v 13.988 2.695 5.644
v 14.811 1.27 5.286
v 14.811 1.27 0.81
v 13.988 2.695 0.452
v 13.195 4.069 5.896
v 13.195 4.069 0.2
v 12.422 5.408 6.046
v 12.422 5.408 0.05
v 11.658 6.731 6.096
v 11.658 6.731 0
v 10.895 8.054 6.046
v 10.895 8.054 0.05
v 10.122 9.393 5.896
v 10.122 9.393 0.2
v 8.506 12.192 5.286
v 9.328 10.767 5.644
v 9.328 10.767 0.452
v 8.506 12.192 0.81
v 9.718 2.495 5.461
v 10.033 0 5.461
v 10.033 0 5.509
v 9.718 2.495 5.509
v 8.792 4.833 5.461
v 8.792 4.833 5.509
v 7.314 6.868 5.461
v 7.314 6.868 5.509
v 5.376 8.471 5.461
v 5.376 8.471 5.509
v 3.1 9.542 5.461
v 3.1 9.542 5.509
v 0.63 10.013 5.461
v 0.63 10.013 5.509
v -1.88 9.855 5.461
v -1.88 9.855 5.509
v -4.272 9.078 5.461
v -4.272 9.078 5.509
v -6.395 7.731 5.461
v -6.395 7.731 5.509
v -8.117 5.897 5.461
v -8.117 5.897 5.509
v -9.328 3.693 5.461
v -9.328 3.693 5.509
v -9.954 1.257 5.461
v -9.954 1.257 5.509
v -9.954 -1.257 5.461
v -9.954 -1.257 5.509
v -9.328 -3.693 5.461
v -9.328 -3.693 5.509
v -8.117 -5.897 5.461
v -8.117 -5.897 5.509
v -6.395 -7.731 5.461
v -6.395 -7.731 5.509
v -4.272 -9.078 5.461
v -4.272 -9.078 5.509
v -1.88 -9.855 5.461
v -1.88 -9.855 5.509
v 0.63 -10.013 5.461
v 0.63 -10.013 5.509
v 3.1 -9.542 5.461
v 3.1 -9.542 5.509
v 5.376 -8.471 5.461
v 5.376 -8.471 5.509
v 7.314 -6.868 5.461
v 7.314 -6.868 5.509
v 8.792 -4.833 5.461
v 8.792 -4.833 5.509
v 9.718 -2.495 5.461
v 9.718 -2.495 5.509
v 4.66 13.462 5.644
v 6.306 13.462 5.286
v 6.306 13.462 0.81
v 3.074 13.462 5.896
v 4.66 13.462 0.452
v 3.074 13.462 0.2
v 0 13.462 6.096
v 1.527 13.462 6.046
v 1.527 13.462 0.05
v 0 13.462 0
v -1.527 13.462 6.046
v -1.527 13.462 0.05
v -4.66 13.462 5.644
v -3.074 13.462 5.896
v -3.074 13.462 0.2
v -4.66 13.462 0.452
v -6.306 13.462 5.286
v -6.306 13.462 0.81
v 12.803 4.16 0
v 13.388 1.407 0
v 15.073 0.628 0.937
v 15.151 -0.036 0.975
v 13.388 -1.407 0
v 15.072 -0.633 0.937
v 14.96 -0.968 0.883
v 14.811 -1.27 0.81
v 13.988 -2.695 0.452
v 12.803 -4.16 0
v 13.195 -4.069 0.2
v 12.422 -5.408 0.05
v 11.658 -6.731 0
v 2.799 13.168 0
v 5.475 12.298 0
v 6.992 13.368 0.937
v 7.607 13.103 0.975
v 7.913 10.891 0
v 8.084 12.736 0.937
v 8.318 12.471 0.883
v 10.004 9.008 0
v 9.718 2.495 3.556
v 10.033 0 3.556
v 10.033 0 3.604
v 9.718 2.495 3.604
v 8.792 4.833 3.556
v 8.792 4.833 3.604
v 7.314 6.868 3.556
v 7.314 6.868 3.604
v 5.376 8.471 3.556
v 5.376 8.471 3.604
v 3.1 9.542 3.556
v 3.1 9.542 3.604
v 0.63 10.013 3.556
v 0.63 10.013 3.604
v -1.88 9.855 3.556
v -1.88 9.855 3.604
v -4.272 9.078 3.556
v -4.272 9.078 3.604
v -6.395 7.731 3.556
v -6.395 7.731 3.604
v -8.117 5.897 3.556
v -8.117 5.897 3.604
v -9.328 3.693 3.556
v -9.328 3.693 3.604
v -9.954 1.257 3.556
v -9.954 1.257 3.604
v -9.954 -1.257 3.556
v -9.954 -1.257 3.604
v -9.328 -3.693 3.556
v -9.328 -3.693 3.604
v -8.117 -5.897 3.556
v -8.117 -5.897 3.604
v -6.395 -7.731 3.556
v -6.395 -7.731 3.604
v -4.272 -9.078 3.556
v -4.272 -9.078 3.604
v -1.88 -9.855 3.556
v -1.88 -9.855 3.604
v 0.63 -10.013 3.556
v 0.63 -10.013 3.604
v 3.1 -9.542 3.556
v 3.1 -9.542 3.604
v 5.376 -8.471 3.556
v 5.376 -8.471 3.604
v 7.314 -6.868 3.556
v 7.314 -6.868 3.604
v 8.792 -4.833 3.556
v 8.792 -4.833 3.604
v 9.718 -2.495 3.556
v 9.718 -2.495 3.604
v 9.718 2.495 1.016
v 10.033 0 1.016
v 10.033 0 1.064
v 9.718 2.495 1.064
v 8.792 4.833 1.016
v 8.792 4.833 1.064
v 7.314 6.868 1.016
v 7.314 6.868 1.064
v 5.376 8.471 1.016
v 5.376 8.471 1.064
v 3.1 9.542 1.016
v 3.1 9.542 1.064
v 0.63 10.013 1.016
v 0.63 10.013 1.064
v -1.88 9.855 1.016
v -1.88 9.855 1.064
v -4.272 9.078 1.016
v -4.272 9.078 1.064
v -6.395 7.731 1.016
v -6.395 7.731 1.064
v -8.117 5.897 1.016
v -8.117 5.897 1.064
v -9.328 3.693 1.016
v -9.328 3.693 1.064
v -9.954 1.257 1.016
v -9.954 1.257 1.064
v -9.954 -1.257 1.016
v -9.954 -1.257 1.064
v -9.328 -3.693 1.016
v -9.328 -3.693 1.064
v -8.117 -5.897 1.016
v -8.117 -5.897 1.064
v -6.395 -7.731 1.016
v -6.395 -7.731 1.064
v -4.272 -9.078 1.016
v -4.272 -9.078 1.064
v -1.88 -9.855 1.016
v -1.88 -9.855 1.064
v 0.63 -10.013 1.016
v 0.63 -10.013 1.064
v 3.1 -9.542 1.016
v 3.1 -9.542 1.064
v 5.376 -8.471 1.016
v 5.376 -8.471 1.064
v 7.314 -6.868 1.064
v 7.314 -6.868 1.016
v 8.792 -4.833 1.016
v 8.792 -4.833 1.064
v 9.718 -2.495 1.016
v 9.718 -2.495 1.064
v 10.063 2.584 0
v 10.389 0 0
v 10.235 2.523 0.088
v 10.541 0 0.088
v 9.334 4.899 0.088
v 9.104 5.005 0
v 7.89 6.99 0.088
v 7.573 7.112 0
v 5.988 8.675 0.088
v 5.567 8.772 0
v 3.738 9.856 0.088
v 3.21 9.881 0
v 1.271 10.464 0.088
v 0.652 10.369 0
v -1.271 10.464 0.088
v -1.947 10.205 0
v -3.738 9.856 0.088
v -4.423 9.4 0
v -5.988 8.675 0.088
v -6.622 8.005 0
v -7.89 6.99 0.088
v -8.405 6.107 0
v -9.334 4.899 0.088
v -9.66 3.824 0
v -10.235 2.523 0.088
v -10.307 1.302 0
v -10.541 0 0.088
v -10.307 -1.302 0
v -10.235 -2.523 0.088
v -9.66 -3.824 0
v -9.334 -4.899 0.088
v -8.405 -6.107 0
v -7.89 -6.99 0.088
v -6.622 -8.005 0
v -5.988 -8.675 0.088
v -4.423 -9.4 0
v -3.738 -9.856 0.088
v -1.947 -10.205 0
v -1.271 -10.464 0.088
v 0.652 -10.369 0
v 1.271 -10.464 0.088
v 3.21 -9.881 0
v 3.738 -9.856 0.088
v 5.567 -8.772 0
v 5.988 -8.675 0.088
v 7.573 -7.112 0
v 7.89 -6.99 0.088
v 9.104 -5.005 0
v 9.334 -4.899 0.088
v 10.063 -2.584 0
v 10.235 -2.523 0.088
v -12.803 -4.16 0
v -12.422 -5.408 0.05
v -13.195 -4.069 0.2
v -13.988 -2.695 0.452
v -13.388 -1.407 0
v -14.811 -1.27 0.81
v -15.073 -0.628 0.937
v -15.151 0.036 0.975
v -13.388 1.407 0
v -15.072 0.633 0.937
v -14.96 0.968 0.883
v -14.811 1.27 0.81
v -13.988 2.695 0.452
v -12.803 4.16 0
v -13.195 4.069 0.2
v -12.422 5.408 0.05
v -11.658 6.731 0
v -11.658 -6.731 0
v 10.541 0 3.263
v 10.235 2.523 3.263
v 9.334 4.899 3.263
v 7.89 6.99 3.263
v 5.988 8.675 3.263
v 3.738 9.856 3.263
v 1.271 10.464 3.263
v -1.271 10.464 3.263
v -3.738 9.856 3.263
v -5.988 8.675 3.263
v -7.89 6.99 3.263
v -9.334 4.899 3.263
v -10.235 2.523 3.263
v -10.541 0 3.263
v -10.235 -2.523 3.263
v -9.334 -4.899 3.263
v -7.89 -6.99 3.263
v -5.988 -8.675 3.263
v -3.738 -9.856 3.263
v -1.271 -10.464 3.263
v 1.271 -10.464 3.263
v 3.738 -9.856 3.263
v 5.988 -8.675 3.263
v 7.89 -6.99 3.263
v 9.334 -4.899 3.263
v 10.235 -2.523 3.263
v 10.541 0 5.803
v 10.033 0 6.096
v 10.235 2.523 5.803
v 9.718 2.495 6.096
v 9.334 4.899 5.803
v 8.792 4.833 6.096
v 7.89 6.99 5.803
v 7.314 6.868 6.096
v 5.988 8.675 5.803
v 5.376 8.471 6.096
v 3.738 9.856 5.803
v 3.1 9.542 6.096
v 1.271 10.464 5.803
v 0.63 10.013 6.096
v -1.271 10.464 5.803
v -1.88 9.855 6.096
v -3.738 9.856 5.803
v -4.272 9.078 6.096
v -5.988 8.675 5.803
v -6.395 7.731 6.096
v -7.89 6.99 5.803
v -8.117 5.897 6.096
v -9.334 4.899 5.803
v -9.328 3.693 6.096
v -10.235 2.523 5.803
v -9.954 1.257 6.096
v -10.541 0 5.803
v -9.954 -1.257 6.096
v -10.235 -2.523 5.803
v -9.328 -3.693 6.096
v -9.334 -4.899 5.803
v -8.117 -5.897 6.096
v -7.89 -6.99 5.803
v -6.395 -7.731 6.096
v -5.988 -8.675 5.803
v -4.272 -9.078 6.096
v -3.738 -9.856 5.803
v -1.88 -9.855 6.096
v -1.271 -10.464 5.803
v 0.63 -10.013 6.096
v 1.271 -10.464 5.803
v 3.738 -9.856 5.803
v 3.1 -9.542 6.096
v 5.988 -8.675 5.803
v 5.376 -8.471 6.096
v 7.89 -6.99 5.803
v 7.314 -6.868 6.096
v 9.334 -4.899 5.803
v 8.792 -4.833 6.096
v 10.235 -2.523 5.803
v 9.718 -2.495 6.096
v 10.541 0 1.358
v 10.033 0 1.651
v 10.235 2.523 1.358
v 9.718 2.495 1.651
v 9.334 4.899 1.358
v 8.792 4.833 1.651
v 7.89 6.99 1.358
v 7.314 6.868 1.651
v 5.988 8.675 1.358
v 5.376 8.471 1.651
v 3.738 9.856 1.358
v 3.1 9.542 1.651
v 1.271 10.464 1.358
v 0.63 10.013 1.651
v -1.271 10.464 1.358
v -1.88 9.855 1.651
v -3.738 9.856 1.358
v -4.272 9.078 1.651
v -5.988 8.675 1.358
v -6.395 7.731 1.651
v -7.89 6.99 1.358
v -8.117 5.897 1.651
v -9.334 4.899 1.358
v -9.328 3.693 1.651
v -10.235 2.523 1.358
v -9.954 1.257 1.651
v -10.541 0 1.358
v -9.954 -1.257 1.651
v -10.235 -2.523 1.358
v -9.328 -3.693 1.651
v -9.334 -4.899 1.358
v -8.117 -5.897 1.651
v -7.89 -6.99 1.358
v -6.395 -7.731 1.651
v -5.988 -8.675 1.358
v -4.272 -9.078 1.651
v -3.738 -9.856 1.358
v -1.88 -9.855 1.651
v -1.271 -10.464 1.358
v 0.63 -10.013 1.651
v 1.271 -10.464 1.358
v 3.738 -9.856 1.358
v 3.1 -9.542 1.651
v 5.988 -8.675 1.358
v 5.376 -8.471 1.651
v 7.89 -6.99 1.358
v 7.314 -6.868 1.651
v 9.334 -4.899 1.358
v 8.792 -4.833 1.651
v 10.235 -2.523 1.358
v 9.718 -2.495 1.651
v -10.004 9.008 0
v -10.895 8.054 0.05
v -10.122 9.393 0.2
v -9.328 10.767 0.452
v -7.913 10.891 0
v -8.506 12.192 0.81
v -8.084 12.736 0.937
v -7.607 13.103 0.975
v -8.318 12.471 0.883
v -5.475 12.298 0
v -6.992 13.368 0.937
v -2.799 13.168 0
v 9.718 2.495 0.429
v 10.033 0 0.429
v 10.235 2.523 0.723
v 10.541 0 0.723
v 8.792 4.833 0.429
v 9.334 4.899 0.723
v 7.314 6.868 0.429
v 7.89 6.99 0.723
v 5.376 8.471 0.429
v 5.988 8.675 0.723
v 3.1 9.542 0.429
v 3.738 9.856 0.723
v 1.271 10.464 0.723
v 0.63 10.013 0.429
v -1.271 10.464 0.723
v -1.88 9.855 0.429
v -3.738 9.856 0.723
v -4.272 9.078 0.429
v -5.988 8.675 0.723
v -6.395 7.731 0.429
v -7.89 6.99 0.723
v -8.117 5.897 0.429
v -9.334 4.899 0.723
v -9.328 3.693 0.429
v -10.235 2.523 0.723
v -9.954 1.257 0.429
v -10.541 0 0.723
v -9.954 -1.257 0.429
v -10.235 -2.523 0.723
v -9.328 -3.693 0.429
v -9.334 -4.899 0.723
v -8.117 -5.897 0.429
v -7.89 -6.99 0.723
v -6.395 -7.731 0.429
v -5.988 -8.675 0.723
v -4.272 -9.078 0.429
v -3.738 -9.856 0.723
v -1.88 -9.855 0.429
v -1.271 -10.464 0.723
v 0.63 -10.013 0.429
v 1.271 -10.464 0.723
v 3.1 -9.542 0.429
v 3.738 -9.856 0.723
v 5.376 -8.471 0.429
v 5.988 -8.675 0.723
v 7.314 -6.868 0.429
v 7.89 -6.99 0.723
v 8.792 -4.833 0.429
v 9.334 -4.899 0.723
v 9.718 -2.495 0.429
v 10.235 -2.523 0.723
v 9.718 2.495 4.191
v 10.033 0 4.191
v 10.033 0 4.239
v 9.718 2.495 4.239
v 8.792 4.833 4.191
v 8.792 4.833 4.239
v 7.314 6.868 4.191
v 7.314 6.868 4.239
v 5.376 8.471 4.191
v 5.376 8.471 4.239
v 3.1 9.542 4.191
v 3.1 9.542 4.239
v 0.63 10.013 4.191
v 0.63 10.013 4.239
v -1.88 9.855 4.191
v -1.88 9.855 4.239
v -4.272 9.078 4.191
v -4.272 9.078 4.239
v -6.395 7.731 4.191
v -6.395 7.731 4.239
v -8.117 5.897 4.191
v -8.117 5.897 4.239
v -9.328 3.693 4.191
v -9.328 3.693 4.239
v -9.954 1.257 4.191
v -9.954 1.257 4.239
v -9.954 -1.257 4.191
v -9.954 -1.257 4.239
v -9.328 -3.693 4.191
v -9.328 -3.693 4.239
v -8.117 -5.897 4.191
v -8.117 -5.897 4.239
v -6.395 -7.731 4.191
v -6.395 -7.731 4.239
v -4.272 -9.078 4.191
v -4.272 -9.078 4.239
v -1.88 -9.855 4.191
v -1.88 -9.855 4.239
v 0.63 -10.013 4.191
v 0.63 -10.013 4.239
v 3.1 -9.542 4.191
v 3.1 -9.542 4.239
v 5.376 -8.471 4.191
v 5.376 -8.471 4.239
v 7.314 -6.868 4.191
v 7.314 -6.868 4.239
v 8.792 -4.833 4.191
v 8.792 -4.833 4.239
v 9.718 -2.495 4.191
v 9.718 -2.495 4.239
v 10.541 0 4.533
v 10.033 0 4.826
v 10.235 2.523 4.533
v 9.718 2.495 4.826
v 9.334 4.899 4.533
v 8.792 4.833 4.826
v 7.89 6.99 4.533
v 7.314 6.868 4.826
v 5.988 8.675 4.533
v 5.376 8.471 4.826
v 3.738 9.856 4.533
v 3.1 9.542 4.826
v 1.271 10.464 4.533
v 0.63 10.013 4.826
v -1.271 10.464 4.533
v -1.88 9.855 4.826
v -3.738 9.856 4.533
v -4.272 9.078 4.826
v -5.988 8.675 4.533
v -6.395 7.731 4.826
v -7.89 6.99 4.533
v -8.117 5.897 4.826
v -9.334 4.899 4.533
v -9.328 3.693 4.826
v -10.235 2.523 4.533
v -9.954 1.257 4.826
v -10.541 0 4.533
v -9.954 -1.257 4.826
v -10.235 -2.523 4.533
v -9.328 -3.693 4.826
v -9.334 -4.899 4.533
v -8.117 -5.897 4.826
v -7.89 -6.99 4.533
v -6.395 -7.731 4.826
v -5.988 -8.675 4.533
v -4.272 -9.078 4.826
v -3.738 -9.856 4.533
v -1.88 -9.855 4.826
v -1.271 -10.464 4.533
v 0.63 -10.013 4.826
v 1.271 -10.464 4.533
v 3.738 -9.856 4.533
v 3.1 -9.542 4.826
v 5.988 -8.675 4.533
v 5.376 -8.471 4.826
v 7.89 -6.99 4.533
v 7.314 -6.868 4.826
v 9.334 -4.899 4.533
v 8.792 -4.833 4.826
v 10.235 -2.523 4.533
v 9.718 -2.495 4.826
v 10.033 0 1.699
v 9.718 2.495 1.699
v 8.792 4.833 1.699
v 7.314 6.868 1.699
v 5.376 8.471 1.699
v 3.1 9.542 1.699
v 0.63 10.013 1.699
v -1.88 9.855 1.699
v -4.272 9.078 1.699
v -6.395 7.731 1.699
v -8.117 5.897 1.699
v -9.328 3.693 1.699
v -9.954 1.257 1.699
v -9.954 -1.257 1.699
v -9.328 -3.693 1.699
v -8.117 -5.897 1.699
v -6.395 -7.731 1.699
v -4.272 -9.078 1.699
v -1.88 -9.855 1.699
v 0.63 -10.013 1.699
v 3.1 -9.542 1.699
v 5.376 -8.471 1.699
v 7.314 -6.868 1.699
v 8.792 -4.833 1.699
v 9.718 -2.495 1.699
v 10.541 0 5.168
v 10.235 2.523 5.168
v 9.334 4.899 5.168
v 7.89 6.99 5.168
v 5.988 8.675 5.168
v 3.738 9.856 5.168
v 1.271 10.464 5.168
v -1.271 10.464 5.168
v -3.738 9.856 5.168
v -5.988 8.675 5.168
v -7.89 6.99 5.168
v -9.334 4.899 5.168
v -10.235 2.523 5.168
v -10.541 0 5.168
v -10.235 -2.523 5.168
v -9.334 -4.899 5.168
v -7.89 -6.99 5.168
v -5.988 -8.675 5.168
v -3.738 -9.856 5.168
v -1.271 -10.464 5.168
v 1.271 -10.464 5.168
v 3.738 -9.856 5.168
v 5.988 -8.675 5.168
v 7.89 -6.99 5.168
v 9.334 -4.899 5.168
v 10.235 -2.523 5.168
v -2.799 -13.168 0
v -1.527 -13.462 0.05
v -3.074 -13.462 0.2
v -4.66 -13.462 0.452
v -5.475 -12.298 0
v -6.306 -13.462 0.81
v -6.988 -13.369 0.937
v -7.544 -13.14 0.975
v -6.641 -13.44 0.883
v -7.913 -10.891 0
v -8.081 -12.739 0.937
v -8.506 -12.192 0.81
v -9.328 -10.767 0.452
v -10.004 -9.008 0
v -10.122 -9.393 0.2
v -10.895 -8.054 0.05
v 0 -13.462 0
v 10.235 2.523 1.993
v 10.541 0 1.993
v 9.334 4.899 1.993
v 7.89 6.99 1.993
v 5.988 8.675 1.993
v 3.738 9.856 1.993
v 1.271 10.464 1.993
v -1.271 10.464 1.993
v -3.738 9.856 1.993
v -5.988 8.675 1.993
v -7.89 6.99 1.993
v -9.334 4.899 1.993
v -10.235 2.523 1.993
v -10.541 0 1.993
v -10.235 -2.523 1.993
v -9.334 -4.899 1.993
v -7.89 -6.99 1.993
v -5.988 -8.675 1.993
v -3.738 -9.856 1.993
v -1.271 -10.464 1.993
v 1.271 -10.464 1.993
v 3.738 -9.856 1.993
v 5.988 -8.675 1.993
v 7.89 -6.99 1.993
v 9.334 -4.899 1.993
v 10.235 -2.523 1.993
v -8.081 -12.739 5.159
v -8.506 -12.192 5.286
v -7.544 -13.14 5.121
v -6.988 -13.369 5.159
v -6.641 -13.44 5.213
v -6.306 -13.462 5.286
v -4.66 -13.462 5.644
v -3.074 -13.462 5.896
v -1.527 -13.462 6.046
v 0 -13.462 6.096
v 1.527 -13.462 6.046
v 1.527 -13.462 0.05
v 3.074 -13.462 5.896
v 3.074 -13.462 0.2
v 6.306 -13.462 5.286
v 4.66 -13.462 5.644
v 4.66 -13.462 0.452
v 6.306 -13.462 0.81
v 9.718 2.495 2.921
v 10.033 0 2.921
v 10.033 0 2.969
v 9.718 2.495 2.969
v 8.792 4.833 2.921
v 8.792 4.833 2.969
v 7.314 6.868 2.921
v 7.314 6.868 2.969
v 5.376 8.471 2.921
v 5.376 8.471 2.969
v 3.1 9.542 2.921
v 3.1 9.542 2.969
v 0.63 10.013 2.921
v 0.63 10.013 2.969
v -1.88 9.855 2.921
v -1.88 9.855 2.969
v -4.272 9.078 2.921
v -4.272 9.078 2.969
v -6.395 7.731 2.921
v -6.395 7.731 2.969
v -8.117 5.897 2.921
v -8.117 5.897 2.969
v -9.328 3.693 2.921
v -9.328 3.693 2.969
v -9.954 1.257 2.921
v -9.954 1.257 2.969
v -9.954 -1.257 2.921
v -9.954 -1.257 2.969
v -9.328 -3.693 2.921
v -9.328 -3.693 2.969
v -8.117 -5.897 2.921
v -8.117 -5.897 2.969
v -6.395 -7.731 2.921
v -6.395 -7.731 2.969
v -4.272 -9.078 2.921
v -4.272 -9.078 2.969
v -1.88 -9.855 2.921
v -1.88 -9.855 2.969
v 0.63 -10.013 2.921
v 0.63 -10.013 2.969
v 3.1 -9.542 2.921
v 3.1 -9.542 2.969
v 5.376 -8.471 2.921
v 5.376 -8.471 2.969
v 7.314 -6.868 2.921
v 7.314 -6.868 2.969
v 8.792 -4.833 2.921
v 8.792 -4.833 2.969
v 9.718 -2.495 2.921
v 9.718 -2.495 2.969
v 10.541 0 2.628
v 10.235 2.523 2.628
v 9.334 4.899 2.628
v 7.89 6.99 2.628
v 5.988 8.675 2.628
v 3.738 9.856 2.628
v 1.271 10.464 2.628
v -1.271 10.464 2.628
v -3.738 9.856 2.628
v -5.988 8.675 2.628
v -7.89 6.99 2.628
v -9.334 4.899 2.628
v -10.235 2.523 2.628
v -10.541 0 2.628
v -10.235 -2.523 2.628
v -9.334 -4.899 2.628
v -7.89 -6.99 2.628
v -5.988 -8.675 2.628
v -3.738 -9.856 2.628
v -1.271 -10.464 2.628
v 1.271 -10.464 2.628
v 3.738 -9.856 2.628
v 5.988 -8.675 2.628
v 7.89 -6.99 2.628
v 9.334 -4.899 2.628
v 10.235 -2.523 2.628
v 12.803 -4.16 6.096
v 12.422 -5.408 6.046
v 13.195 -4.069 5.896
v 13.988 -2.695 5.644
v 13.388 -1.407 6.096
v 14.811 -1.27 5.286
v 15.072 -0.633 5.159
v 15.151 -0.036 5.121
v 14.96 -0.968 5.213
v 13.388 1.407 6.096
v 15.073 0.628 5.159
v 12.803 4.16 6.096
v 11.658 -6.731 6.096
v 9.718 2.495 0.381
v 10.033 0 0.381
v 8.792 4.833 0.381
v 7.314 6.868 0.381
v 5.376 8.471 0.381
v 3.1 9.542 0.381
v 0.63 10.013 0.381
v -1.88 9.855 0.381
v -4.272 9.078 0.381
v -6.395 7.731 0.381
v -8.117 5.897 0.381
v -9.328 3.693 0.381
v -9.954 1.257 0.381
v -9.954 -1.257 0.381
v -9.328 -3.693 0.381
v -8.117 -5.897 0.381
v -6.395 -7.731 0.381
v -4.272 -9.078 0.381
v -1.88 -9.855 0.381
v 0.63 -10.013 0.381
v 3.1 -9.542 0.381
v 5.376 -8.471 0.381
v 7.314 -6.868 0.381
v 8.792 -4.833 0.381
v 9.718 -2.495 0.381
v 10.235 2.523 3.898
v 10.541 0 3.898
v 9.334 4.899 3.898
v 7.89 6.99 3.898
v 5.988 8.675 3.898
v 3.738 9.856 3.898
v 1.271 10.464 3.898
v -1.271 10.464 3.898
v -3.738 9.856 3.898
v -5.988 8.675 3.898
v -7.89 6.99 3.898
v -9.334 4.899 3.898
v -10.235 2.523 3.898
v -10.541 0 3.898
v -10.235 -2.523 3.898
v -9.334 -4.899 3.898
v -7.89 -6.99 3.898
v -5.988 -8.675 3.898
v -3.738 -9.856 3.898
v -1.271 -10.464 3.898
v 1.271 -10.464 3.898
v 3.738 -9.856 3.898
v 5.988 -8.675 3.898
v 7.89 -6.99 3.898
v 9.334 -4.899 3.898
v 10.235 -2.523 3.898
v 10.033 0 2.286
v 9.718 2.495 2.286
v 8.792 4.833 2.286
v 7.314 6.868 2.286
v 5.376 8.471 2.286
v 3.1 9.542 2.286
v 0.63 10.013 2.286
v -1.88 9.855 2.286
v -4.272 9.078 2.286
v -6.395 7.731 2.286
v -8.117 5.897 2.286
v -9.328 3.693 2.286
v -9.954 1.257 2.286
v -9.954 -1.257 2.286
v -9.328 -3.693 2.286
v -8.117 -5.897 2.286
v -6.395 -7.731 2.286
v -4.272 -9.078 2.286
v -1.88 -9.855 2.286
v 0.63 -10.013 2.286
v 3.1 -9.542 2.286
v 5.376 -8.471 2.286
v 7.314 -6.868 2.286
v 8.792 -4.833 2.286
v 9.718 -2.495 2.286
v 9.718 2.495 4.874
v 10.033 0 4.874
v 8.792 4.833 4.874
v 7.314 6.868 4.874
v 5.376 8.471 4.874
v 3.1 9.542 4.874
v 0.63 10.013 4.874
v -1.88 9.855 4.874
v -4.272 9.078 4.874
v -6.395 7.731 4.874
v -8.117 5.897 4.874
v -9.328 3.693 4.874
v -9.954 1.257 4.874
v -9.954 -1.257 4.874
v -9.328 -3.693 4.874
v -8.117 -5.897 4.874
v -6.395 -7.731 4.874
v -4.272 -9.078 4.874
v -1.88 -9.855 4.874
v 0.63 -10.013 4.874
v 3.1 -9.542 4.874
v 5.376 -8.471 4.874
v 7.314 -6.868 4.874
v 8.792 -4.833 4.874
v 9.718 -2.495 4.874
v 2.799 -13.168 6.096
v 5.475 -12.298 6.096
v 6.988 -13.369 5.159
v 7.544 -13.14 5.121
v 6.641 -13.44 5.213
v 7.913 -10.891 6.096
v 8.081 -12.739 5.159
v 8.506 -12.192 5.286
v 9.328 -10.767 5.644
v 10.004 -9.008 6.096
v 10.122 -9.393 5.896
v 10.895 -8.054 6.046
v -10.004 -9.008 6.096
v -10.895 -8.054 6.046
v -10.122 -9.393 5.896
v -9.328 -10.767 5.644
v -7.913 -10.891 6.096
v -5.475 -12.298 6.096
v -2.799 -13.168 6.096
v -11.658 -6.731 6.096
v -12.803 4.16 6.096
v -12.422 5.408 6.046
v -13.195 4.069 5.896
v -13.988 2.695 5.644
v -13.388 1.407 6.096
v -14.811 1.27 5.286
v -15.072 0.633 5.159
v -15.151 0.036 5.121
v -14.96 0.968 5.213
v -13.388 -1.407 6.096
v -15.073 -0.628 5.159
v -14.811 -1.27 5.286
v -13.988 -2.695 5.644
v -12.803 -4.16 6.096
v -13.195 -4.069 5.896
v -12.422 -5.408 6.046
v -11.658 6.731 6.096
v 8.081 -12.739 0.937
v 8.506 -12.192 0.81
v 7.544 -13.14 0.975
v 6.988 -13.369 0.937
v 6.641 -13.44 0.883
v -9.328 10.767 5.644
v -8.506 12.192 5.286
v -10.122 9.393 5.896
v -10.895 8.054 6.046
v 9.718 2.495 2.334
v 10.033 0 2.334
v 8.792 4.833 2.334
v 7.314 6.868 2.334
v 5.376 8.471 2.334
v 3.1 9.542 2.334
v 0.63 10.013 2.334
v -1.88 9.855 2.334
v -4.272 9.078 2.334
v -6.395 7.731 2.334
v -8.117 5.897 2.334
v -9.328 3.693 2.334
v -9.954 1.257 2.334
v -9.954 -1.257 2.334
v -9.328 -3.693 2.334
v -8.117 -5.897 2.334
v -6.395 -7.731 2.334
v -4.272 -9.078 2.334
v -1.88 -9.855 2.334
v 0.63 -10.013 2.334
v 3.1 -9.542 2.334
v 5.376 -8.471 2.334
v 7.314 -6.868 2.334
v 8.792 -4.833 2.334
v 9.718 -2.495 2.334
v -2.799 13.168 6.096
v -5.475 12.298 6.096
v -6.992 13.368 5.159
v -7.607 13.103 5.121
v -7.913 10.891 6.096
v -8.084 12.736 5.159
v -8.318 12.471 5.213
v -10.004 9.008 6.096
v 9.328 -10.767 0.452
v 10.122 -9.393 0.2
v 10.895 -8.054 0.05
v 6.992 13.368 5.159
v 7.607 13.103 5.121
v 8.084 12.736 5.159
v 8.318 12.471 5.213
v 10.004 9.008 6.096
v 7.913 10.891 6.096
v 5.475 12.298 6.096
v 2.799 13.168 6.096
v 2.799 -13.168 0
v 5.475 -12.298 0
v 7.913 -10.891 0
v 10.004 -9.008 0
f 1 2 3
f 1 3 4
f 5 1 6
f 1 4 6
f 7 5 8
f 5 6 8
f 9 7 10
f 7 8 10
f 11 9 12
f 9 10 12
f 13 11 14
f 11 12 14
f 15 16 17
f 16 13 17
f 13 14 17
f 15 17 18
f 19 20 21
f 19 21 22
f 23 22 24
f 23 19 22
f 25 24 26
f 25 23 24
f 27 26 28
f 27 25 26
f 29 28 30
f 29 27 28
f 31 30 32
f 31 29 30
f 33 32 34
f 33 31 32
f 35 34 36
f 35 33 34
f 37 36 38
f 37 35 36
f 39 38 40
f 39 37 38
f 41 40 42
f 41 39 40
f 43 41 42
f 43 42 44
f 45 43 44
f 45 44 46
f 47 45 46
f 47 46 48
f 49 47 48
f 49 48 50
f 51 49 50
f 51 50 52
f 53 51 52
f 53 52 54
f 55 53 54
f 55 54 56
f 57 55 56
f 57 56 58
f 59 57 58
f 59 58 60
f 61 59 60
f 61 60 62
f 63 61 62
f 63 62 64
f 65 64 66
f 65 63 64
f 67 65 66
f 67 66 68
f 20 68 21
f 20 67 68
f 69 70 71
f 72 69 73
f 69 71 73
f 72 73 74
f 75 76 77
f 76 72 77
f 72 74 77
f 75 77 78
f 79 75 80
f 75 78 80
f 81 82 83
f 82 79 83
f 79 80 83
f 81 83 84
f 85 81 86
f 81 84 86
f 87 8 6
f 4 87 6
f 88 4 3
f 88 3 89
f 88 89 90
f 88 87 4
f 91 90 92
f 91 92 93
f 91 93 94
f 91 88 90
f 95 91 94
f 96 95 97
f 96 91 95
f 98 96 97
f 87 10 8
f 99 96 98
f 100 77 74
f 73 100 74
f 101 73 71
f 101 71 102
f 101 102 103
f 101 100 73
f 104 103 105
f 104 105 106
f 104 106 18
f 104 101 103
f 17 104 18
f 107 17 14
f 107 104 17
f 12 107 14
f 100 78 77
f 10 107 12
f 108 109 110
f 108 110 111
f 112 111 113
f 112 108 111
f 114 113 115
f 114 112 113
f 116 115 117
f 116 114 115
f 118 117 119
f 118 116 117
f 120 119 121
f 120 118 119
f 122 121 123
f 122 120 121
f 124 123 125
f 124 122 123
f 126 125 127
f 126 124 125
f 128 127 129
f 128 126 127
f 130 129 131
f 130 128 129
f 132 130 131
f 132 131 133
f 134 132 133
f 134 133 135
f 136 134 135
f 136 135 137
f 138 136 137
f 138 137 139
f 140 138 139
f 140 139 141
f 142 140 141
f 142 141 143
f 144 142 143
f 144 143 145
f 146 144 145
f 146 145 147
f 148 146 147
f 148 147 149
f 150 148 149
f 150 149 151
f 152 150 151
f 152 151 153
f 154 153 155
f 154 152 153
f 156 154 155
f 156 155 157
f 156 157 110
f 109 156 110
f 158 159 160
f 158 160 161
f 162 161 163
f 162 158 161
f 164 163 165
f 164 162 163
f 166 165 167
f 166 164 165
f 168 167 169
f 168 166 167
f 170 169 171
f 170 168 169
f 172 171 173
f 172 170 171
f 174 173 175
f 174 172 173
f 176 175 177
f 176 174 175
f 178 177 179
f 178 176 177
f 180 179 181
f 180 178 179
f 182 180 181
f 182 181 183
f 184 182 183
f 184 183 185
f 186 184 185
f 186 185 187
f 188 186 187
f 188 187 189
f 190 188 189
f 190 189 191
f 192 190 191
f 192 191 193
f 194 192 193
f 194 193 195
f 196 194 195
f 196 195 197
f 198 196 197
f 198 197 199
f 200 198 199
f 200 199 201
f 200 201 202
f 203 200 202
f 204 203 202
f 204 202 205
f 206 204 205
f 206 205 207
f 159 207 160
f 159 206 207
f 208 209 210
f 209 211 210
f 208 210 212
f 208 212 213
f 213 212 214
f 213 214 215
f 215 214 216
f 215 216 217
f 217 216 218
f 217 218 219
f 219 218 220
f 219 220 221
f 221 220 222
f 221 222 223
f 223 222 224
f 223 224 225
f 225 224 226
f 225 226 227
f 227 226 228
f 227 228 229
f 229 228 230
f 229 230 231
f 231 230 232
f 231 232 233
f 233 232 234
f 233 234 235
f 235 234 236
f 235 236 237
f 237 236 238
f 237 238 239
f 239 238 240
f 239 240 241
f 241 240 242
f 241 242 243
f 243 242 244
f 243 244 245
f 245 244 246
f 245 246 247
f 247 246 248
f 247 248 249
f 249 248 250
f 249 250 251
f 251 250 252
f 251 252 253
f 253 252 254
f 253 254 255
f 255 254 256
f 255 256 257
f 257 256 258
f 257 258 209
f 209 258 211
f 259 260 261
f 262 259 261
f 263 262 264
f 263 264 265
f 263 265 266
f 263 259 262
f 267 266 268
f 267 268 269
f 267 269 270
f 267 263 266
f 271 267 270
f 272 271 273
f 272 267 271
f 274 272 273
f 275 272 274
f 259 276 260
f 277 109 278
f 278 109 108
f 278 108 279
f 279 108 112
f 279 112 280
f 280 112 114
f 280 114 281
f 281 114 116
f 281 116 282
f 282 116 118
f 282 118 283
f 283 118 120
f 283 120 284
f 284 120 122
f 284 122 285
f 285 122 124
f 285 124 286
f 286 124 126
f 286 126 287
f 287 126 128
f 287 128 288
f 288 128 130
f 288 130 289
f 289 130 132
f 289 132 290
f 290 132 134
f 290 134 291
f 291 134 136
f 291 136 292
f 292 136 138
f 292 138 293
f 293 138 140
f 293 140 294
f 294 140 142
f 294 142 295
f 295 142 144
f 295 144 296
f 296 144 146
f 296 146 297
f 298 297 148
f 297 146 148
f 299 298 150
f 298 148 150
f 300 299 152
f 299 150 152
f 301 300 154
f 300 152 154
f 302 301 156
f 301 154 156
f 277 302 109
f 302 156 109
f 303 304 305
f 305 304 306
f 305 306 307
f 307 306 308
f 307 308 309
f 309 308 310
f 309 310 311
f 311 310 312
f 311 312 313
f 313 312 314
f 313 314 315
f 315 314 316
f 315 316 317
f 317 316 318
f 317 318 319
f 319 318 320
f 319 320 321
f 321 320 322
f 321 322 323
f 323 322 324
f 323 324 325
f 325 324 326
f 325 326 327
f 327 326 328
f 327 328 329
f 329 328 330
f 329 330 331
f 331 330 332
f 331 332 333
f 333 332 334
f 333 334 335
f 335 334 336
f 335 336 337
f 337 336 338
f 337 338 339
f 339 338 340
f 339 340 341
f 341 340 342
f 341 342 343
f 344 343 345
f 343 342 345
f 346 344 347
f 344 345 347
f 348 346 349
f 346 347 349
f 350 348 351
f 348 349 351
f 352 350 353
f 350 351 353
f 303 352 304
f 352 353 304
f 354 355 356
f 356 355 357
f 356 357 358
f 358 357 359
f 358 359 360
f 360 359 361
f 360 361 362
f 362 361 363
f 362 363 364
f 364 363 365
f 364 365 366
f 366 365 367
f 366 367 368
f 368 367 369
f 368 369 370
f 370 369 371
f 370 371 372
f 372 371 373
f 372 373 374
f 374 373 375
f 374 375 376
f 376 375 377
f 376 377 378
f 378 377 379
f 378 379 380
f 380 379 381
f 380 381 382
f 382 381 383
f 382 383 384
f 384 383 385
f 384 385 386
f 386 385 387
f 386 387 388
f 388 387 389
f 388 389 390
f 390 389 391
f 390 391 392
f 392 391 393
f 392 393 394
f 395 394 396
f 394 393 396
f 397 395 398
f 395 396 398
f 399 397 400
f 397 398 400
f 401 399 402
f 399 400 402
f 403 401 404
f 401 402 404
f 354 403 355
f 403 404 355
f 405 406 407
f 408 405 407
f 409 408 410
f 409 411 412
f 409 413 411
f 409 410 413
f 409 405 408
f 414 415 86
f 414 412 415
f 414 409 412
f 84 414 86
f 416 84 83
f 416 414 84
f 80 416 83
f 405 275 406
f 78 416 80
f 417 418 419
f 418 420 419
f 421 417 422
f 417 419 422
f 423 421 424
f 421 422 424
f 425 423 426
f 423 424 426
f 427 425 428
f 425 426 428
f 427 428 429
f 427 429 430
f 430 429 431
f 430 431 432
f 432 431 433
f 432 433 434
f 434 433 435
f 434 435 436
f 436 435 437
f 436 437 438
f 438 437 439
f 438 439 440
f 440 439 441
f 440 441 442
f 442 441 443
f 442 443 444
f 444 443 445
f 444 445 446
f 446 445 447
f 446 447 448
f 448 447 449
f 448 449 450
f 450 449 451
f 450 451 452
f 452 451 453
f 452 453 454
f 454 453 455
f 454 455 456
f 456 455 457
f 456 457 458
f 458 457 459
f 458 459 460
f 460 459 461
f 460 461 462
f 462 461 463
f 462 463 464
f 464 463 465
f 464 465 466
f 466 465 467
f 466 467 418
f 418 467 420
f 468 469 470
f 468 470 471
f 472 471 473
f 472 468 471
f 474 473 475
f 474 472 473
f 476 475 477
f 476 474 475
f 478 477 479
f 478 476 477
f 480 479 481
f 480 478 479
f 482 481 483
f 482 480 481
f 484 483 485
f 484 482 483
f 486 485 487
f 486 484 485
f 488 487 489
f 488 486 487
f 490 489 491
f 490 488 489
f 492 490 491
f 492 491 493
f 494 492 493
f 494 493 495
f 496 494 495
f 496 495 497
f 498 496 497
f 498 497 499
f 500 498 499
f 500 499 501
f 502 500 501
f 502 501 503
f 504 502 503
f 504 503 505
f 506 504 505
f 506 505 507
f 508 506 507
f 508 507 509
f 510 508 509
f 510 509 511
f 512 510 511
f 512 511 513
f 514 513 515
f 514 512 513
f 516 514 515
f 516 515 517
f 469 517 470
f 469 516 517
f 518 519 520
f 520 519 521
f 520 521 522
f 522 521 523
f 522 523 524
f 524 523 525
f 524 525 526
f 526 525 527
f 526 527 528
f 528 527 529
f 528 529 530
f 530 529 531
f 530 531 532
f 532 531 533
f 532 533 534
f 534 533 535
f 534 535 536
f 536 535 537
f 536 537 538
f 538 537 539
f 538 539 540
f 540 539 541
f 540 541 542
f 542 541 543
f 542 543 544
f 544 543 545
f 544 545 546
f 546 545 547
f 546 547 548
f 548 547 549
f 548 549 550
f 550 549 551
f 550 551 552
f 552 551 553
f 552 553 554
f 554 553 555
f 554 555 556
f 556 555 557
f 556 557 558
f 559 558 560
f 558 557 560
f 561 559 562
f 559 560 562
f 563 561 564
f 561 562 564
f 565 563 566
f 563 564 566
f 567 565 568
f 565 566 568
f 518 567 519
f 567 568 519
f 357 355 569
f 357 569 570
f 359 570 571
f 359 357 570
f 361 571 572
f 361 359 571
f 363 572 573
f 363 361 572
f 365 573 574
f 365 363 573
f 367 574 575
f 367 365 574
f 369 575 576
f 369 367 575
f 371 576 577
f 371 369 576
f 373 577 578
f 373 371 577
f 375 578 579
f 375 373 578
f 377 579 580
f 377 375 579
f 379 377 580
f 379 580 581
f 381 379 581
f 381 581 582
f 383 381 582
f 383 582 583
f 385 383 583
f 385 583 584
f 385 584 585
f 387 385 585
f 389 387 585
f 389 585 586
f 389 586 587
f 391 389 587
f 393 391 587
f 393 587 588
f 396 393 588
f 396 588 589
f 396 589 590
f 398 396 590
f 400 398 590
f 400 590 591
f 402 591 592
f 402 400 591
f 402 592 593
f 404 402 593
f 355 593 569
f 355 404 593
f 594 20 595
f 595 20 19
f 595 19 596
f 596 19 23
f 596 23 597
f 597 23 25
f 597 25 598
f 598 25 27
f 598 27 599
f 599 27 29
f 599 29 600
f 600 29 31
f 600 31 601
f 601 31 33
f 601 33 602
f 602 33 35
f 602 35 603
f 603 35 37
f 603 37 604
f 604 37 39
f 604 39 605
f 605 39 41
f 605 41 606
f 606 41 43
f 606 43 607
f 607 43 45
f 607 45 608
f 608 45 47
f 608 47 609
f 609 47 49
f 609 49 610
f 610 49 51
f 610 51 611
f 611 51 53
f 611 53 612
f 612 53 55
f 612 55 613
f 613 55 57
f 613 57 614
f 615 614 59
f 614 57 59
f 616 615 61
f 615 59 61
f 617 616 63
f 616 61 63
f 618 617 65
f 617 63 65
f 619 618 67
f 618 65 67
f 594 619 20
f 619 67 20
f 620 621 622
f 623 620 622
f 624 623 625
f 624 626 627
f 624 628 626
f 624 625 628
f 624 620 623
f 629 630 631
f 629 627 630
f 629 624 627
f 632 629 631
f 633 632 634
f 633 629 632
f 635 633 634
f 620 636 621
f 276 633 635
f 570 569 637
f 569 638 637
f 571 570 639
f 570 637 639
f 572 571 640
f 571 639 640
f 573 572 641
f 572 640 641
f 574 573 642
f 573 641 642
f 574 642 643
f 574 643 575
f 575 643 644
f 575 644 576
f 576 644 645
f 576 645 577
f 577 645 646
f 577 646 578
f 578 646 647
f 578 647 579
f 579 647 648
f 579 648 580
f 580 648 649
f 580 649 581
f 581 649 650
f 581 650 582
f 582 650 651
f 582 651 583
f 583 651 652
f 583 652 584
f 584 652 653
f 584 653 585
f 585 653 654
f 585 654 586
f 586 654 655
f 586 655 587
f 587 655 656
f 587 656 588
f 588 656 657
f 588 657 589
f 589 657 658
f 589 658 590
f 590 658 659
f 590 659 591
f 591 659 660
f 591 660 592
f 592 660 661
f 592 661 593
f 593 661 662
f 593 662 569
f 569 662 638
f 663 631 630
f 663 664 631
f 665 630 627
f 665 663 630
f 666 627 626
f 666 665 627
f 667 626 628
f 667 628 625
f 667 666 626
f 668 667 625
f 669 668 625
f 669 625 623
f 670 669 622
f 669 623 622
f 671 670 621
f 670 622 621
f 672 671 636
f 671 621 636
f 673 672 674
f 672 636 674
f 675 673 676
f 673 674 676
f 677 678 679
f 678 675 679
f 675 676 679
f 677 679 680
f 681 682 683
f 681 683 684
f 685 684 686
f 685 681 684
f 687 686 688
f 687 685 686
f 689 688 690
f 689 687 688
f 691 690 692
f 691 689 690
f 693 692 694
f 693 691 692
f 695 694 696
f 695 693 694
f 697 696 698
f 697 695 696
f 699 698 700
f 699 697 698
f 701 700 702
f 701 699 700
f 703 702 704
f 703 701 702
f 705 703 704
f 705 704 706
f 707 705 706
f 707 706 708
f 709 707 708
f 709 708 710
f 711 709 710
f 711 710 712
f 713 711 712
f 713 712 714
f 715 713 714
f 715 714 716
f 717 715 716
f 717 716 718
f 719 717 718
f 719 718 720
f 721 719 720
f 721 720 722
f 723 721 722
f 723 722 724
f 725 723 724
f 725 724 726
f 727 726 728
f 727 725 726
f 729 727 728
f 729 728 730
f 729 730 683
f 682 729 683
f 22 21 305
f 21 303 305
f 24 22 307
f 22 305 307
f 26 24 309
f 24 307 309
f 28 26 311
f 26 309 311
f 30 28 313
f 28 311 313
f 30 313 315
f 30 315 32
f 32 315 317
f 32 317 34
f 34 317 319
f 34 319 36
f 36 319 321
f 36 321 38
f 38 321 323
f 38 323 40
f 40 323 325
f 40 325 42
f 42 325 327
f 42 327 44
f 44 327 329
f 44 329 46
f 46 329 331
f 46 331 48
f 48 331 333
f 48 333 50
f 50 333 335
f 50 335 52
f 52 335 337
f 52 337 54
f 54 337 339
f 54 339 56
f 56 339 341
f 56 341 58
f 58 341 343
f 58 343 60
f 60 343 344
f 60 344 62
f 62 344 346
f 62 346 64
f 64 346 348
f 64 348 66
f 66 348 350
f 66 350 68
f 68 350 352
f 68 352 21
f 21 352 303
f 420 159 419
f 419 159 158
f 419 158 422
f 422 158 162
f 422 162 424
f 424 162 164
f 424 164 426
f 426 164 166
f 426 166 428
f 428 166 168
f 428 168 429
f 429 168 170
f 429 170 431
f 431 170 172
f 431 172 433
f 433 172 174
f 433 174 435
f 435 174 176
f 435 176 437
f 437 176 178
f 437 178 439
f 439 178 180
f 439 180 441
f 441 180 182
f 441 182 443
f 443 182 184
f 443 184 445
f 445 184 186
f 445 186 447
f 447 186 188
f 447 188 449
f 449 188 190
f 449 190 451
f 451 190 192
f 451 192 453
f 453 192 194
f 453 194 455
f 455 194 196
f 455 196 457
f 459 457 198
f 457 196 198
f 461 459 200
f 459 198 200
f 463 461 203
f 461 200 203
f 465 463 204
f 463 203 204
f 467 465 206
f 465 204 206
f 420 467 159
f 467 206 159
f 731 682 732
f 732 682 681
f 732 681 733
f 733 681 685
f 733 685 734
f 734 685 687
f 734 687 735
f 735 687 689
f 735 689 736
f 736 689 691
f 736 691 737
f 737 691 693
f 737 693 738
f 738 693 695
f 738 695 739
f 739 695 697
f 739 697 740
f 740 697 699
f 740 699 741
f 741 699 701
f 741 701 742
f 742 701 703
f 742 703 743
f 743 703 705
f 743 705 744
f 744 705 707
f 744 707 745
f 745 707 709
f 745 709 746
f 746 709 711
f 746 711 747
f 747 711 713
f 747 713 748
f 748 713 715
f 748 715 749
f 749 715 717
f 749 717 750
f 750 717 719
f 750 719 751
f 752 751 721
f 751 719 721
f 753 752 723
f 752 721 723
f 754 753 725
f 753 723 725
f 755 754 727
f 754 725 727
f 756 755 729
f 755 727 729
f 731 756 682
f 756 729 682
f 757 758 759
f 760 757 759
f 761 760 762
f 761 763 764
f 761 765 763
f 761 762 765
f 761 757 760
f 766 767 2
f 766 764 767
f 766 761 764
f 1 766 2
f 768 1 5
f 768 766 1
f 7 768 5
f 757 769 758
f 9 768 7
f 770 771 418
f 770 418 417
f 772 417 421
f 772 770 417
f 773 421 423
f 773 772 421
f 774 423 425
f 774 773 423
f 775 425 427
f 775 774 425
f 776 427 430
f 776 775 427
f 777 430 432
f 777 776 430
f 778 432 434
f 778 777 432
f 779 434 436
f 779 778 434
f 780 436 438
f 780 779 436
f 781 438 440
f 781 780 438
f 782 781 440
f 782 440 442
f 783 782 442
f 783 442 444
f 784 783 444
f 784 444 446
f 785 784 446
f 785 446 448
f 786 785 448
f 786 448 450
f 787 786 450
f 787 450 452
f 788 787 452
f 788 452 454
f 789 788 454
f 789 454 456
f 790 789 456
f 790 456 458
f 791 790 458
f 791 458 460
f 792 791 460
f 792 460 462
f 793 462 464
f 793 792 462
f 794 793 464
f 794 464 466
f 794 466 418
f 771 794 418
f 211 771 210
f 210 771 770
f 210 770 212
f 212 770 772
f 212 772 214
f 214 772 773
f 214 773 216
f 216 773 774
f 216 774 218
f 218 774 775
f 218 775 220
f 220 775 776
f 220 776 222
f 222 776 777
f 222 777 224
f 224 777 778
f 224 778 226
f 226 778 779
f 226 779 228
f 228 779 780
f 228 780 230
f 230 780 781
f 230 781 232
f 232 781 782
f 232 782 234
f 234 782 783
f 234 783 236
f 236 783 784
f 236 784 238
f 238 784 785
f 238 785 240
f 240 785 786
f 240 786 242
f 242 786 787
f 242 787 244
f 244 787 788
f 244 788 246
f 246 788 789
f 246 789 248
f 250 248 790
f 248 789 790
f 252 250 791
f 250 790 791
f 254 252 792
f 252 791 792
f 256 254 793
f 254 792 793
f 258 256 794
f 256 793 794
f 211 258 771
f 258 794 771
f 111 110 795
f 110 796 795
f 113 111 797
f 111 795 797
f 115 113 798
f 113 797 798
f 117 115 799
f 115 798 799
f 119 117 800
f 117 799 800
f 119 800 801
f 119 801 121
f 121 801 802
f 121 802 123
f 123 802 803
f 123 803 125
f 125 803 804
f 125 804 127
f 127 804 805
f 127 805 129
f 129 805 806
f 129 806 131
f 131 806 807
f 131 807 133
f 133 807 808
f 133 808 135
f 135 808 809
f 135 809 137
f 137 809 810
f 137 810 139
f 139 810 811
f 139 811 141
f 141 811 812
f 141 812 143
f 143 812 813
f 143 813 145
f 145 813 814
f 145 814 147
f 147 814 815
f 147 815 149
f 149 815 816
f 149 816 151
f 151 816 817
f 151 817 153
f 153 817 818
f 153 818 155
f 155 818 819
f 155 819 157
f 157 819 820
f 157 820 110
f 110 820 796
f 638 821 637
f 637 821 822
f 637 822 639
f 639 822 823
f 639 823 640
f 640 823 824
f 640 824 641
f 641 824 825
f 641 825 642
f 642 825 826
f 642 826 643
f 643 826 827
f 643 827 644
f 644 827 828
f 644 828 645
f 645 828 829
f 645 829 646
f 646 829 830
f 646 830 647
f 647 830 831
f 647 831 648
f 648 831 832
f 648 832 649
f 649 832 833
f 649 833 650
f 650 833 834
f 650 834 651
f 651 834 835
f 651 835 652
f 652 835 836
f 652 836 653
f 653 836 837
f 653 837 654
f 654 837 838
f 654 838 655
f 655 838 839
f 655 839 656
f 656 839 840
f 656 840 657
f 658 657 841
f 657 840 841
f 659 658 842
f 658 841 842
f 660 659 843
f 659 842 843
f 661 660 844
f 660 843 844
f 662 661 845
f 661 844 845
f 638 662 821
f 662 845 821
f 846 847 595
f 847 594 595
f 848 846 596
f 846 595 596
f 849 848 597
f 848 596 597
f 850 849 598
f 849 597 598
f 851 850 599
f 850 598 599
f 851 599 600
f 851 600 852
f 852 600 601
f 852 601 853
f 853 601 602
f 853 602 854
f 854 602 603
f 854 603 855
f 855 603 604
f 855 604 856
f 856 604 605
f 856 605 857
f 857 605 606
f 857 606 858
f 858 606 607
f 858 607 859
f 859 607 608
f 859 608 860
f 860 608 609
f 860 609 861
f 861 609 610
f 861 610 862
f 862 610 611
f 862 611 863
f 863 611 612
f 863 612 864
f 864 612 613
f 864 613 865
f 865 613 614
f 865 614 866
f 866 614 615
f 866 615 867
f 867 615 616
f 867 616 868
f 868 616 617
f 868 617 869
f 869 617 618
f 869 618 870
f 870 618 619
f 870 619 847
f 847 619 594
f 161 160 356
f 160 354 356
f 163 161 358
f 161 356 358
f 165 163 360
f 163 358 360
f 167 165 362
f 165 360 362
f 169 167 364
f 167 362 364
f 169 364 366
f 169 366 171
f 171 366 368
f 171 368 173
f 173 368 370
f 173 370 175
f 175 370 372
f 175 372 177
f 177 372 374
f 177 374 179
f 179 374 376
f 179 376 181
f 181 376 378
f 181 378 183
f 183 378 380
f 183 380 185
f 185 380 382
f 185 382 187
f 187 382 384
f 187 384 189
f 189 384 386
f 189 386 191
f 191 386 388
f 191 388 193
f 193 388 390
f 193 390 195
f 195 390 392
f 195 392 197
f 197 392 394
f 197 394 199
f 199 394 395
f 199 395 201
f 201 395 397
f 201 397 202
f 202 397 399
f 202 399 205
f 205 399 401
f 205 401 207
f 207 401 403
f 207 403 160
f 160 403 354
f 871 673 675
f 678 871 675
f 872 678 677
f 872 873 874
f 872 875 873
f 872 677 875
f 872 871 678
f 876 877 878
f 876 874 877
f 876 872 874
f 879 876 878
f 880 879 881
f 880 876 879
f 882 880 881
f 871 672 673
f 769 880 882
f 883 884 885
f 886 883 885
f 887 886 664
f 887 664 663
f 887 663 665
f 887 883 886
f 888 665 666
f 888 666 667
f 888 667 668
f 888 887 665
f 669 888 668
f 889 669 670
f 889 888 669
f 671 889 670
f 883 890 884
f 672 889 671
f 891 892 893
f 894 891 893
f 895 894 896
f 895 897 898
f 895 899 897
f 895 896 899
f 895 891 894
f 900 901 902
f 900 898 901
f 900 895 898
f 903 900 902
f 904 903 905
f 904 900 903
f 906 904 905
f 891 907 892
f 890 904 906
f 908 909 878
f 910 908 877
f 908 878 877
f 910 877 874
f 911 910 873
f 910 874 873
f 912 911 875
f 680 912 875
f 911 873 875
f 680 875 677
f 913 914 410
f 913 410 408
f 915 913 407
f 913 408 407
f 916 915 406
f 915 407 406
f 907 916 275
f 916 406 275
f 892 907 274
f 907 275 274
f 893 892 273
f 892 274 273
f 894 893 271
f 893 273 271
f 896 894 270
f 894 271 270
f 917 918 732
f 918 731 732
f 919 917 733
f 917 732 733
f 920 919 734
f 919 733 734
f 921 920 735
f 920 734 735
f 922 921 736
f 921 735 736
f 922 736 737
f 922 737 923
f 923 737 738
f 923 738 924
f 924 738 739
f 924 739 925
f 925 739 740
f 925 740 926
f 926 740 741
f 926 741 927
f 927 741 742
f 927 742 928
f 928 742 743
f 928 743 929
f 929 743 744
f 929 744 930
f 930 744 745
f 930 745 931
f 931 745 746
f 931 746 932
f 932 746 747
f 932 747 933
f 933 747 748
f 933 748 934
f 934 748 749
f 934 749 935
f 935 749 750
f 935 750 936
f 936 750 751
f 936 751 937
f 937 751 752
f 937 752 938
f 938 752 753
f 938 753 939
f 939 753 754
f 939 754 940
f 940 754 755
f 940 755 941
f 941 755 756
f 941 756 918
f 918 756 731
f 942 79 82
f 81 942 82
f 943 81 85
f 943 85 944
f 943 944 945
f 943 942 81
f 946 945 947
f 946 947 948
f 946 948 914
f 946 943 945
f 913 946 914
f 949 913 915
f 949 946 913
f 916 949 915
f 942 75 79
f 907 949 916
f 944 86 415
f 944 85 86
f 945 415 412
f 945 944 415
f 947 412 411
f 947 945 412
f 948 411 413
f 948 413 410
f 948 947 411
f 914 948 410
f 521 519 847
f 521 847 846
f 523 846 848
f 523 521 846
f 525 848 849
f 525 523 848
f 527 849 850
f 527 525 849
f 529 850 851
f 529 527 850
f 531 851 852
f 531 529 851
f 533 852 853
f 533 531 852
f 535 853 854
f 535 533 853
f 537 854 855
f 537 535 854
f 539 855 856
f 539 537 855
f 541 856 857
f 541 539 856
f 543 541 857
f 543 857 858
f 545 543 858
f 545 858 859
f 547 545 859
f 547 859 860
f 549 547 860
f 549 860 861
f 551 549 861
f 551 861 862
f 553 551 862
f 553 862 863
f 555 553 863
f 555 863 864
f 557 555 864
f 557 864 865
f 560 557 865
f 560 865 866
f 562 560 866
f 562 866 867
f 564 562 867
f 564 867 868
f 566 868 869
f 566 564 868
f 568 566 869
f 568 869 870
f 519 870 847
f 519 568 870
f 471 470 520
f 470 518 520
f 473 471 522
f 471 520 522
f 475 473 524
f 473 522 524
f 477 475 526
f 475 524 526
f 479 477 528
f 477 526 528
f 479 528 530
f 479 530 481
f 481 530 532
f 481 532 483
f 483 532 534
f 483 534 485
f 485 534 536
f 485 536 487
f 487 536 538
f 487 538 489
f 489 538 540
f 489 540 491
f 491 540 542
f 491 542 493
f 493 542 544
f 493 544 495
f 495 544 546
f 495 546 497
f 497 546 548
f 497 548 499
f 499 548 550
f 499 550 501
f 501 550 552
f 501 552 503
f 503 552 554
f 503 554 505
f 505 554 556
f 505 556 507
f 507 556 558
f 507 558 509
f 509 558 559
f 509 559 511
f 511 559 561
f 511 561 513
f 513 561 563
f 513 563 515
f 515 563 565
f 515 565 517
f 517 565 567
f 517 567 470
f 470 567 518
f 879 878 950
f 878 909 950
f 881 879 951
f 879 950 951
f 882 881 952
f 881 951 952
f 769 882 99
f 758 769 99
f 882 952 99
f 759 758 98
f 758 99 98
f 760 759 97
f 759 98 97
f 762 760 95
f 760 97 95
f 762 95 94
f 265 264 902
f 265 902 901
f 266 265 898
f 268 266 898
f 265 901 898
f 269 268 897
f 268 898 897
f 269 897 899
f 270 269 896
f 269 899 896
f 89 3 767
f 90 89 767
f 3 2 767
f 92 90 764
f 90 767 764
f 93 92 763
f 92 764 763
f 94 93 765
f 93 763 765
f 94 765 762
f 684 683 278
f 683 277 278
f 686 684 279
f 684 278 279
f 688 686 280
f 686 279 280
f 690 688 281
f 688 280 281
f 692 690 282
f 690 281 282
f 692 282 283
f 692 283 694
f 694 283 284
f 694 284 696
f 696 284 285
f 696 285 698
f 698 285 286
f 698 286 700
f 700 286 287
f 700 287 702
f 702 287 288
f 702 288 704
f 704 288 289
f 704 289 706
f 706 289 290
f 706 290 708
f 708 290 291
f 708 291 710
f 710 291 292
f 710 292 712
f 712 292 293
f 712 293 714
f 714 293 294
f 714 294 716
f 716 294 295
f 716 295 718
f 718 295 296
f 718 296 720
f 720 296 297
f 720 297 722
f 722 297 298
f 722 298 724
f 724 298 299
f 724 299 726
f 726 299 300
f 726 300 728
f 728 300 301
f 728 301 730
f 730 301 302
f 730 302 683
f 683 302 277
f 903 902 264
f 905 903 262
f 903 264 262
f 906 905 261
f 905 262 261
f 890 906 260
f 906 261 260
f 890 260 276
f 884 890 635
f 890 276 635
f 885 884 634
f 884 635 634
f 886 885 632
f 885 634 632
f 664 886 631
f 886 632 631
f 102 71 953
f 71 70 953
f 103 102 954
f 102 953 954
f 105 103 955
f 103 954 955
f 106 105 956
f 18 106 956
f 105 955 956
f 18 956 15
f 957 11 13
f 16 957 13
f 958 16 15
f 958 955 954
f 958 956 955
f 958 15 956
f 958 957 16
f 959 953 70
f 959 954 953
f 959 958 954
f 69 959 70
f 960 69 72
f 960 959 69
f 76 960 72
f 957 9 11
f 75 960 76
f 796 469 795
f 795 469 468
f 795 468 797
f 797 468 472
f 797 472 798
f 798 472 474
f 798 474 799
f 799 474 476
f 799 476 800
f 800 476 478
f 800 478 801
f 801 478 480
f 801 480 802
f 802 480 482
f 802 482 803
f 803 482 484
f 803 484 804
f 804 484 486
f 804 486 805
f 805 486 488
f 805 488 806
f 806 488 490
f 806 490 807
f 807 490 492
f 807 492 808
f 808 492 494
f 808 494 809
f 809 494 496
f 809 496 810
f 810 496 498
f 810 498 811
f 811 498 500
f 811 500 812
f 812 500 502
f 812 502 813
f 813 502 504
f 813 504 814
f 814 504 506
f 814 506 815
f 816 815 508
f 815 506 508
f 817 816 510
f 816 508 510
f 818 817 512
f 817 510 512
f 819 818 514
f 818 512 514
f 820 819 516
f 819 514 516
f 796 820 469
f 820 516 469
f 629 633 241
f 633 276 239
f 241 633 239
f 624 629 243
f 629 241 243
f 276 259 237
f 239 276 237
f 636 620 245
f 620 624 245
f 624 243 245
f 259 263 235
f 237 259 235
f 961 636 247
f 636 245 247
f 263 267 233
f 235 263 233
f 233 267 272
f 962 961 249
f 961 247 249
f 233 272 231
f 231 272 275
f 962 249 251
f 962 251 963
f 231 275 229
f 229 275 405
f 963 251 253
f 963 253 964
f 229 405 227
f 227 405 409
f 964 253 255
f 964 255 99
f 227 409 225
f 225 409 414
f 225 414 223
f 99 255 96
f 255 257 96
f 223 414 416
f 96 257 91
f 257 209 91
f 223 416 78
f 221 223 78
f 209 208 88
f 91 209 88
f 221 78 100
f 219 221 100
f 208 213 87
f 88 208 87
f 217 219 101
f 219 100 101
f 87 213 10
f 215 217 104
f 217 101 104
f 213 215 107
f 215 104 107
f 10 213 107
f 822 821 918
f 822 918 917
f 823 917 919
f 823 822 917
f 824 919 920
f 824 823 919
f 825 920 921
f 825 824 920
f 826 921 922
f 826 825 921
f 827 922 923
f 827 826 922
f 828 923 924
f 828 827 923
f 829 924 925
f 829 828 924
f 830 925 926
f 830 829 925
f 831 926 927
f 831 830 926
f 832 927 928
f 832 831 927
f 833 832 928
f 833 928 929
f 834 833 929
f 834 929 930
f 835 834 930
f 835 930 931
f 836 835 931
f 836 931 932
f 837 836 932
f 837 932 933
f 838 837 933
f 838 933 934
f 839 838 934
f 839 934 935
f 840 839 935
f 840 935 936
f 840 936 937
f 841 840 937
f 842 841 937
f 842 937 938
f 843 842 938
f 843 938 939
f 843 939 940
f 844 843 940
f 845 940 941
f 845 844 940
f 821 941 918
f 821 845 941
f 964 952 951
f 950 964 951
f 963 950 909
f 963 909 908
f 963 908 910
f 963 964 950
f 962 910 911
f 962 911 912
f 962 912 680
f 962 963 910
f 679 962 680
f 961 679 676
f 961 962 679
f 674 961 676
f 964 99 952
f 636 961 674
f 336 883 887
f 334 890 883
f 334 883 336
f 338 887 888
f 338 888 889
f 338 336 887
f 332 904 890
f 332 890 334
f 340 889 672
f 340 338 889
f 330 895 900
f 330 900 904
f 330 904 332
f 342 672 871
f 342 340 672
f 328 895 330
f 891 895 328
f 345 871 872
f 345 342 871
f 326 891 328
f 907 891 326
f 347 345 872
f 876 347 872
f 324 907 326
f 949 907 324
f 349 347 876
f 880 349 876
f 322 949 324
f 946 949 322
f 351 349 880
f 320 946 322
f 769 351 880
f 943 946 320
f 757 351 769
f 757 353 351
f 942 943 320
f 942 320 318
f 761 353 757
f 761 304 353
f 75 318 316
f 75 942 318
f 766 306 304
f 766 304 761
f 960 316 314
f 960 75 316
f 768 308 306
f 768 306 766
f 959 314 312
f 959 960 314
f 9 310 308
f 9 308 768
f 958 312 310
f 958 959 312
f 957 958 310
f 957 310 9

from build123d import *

# Parameters (mm, degrees)
SKETCH1_R          = 10.033
EXTRUDE1_DEPTH     = 6.096
SKETCH2_OUTSIDE_W  = 65.986
SKETCH2_OUTSIDE_H  = 61.82
SKETCH2_OUTSIDE_R  = 13.462
CUT_EXTRUDE1_DEPTH = 7.096
CUT_EXTRUDE1_DRAFT = -60
SKETCH3_OUTSIDE_W  = 65.986
SKETCH3_OUTSIDE_H  = 61.82
SKETCH3_OUTSIDE_R  = 13.462
CUT_EXTRUDE2_DEPTH = 7.096
CUT_EXTRUDE2_DRAFT = -60
FILLET1_R          = 2.54
LPATTERN1_COUNT    = 10
LPATTERN1_PITCH    = 0.635


with BuildPart() as part:
    # Sketch1 → Extrude1 (new body)
    with BuildSketch(Plane.XY):
        Polygon((-15.544578648, 0), (-7.772289324, -13.462), (7.772289324, -13.462), (15.544578648, 0), (7.772289324, 13.462), (-7.772289324, 13.462), align=None)
        Circle(SKETCH1_R, mode=Mode.SUBTRACT)
    extrude(amount=EXTRUDE1_DEPTH)


with BuildPart() as cut_extrude1_tool:
    # Sketch2 outside → Cut-Extrude1 (with draft: the straight prism first)
    with BuildSketch(Plane.XY.offset(6.096)):
        Rectangle(SKETCH2_OUTSIDE_W, SKETCH2_OUTSIDE_H)
        Circle(SKETCH2_OUTSIDE_R, mode=Mode.SUBTRACT)
    extrude(amount=-CUT_EXTRUDE1_DEPTH)
    # Cut-Extrude1: the draft: its side faces are tilted about the plane it starts from
    cut_extrude1_sides = [cut_extrude1_tool.faces().sort_by_distance(p)[0] for p in [
        (0, -30.91, 2.548),
        (32.993, 0, 2.548),
        (0, 30.91, 2.548),
        (-32.993, 0, 2.548),
        (-13.462, 0, 2.548),
    ]]
    draft(cut_extrude1_sides, Plane.XY.offset(6.096), CUT_EXTRUDE1_DRAFT)


with BuildPart() as part_1:
    add(part.part)

    # Cut-Extrude1: cut by cut_extrude1_tool
    add(cut_extrude1_tool.part, mode=Mode.SUBTRACT)


with BuildPart() as cut_extrude2_tool:
    # Sketch3 outside → Cut-Extrude2 (with draft: the straight prism first)
    with BuildSketch(Plane(origin=(0, 0, 0), x_dir=(-1, 0, 0), z_dir=(0, 0, -1))):
        Rectangle(SKETCH3_OUTSIDE_W, SKETCH3_OUTSIDE_H)
        Circle(SKETCH3_OUTSIDE_R, mode=Mode.SUBTRACT)
    extrude(amount=-CUT_EXTRUDE2_DEPTH)
    # Cut-Extrude2: the draft: its side faces are tilted about the plane it starts from
    cut_extrude2_sides = [cut_extrude2_tool.faces().sort_by_distance(p)[0] for p in [
        (0, -30.91, 3.548),
        (-32.993, 0, 3.548),
        (0, 30.91, 3.548),
        (32.993, 0, 3.548),
        (13.462, 0, 3.548),
    ]]
    draft(cut_extrude2_sides, Plane(origin=(0, 0, 0), x_dir=(-1, 0, 0), z_dir=(0, 0, -1)), CUT_EXTRUDE2_DRAFT)


with BuildPart() as part_2:
    add(part_1.part)

    # Cut-Extrude2: cut by cut_extrude2_tool
    add(cut_extrude2_tool.part, mode=Mode.SUBTRACT)

    # Fillet1
    fillet1_edges = [part_2.edges().sort_by_distance(p)[0] for p in [
        (15.544578648, 0, 3.048),
        (7.772289324, -13.462, 3.048),
        (-7.772289324, -13.462, 3.048),
        (-15.544578648, 0, 3.048),
        (-7.772289324, 13.462, 3.048),
        (7.772289324, 13.462, 3.048),
    ]]
    fillet(fillet1_edges, radius=FILLET1_R)

    # Sketch4 → Cut-Revolve1 (revolve, cut)
    with BuildSketch(Plane(origin=(0, 0, 0), x_dir=(1, 0, 0), z_dir=(0, 1, 0)), mode=Mode.PRIVATE) as cut_revolve1_sk:
        Polygon((-10.033, -6.096), (-10.033, -5.509412127), (-10.541, -5.802706063), align=None)
    cut_revolve1 = revolve(cut_revolve1_sk.sketch.rotate(Axis((0, 0, 0), (0, 0, 1)), 180), axis=Axis((0, 0, 0), (0, 0, 1)), mode=Mode.SUBTRACT)  # turned: the seam where the file's is

    # LPattern1: Cut-Revolve1 ×10
    with Locations(*[(0, 0, -i * LPATTERN1_PITCH) for i in range(1, LPATTERN1_COUNT)]):
        add(cut_revolve1, mode=Mode.SUBTRACT)


solid = part_2.part
